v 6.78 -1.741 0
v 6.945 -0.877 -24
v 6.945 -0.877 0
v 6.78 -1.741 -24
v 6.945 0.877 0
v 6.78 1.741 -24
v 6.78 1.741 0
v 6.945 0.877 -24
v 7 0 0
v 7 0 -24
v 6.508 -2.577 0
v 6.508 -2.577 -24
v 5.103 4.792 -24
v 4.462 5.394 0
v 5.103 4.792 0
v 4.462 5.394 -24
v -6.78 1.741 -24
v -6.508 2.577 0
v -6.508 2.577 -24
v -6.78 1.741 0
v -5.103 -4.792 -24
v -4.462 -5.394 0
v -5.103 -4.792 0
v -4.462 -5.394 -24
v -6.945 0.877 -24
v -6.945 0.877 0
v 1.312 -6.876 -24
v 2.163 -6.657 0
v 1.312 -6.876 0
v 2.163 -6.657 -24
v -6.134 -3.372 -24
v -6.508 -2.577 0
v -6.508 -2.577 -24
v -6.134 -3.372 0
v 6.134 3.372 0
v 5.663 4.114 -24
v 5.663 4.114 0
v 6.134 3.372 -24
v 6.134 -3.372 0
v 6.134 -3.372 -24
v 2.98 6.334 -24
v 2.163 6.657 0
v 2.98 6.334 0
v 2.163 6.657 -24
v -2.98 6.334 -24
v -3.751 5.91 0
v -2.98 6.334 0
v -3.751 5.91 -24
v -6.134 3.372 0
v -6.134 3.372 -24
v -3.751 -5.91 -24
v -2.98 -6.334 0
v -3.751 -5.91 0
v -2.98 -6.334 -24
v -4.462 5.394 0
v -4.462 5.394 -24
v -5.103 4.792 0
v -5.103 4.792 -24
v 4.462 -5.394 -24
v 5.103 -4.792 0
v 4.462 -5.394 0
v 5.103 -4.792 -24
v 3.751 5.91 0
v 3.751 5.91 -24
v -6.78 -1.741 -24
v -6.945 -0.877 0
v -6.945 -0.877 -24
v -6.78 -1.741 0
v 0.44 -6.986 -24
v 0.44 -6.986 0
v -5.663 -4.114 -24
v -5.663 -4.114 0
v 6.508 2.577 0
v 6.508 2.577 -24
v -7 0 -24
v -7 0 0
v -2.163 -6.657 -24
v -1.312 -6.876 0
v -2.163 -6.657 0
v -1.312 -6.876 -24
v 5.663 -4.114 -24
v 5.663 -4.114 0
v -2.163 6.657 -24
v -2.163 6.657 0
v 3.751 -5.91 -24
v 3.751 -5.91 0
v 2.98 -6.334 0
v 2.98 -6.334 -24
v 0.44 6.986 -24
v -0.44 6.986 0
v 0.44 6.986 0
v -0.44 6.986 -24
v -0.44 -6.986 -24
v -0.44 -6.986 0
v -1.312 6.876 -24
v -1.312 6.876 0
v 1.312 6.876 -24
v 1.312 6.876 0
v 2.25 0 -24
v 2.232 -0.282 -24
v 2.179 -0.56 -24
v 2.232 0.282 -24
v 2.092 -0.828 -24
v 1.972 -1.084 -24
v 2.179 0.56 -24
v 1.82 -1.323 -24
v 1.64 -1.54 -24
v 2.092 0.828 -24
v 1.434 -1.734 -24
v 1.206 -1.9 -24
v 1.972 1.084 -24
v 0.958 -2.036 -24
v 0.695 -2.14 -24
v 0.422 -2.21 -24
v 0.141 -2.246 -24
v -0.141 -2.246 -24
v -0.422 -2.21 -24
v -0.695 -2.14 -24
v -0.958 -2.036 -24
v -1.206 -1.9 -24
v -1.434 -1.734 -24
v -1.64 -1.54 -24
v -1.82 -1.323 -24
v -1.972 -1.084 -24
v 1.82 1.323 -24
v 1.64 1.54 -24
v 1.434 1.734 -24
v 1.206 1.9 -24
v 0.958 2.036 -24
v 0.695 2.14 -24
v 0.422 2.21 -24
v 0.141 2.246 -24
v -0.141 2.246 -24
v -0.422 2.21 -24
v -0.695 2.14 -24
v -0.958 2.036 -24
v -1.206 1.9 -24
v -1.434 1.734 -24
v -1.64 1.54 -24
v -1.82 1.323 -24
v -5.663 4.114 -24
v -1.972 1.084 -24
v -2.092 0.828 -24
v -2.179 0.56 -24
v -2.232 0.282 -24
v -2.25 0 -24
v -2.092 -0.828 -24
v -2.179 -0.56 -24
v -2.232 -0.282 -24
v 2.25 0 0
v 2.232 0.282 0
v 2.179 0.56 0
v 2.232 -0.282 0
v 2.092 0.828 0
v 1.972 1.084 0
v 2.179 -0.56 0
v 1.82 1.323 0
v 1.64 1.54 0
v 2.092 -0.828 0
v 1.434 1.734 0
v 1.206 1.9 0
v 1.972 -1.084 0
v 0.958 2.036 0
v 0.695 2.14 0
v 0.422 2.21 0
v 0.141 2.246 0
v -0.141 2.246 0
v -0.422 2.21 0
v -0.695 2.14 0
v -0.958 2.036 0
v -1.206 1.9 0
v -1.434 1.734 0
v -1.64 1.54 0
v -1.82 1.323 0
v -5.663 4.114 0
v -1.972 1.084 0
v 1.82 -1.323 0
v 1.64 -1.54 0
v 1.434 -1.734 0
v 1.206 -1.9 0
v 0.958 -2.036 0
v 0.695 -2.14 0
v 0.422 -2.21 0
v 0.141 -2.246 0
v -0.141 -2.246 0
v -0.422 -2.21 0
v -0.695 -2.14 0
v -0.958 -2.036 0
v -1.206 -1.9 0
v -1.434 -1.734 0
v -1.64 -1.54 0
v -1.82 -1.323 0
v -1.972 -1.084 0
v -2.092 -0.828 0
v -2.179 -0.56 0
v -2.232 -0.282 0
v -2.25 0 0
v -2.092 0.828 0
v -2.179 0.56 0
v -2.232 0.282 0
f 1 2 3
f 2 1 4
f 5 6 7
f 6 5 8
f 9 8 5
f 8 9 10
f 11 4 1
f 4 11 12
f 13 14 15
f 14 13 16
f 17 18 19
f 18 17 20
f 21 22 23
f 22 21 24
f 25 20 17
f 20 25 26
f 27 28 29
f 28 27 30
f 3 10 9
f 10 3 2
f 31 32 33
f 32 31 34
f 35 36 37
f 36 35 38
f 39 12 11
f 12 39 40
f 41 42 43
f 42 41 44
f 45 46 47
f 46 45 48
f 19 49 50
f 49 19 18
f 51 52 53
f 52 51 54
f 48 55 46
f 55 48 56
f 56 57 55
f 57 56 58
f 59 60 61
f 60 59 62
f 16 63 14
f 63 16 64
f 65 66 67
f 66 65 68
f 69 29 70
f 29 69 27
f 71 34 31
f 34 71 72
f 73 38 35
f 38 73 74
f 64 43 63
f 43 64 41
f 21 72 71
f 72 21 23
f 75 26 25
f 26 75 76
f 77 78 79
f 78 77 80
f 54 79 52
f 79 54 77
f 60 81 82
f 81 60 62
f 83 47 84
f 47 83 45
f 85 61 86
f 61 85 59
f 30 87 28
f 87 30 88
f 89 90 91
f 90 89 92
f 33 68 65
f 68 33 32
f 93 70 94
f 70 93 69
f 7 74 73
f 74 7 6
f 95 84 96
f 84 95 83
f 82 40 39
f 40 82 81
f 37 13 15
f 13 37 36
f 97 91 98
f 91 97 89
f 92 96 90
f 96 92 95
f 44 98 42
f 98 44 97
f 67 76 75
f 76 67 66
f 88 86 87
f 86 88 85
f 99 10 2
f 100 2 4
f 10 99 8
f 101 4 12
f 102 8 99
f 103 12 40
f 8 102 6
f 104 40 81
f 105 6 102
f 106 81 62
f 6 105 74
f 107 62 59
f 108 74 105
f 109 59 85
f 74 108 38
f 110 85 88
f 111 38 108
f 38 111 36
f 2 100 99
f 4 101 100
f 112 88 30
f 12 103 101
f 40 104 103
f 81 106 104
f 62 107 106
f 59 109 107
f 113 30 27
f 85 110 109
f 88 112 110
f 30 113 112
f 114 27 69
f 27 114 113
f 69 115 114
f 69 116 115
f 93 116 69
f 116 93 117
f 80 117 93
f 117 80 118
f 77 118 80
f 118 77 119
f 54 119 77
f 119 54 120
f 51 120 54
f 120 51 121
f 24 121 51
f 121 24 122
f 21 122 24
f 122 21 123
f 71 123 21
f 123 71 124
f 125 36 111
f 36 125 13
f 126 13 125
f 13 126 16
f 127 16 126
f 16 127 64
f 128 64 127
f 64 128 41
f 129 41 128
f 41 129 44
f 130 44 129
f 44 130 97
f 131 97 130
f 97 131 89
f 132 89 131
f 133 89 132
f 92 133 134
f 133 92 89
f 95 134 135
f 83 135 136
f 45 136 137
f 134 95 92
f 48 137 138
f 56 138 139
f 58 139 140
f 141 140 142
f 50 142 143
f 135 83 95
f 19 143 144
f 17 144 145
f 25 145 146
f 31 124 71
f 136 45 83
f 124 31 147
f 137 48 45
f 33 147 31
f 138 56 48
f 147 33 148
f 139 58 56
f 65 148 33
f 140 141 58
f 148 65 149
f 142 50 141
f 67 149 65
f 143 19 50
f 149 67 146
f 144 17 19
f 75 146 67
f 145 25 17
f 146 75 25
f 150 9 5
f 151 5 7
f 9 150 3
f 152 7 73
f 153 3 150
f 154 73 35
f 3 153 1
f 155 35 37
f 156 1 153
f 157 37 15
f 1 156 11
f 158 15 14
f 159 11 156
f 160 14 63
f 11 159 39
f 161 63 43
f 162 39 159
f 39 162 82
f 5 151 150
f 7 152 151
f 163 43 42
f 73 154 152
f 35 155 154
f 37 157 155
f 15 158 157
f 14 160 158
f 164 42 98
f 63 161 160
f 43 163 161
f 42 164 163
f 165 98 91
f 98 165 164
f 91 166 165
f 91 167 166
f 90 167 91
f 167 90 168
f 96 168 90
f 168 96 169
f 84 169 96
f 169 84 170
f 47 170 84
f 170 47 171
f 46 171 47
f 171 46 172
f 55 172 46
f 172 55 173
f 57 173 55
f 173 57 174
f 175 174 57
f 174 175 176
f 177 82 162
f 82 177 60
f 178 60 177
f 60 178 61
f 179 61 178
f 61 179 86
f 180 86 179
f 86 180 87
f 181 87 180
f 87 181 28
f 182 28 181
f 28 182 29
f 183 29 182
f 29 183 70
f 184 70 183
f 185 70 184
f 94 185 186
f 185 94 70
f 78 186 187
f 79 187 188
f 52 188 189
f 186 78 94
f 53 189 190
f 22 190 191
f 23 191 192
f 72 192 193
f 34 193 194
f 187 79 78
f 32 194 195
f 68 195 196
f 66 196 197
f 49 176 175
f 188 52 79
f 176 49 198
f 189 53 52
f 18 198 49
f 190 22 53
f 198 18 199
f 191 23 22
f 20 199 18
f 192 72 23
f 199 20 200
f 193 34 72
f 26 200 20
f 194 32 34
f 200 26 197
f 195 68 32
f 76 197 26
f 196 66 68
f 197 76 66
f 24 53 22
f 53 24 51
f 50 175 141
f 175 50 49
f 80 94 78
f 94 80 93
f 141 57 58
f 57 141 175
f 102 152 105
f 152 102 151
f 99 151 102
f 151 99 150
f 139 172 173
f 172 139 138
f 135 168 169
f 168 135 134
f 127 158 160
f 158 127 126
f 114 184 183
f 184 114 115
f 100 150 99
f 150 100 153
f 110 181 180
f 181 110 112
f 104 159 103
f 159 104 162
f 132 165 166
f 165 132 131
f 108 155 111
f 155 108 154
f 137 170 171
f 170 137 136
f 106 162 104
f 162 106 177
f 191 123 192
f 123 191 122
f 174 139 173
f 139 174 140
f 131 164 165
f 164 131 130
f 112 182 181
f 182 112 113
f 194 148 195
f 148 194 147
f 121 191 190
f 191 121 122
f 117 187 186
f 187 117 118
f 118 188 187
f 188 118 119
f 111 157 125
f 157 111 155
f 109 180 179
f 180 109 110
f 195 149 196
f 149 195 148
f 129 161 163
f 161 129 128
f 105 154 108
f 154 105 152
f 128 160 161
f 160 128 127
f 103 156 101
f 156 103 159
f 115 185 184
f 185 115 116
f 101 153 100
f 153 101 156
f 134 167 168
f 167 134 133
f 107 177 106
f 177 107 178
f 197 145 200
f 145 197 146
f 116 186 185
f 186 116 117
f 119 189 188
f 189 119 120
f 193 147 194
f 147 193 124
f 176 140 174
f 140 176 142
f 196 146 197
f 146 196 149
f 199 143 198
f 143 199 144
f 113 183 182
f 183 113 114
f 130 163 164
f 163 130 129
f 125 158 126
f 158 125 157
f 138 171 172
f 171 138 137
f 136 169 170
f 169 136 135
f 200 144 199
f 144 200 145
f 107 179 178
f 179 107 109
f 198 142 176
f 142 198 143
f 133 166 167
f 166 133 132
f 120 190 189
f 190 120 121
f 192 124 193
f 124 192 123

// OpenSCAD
$fn = 50;


difference() {
	union() {
		translate(v = [0, 0, -24.0000000000]) {
			cylinder(h = 24, r = 7.0000000000);
		}
		cylinder(h = 0, r = 17.0000000000);
	}
	union() {
		#translate(v = [0, 0, -24]) {
			cylinder(h = 24, r = 2.2500000000);
		}
	}
}
